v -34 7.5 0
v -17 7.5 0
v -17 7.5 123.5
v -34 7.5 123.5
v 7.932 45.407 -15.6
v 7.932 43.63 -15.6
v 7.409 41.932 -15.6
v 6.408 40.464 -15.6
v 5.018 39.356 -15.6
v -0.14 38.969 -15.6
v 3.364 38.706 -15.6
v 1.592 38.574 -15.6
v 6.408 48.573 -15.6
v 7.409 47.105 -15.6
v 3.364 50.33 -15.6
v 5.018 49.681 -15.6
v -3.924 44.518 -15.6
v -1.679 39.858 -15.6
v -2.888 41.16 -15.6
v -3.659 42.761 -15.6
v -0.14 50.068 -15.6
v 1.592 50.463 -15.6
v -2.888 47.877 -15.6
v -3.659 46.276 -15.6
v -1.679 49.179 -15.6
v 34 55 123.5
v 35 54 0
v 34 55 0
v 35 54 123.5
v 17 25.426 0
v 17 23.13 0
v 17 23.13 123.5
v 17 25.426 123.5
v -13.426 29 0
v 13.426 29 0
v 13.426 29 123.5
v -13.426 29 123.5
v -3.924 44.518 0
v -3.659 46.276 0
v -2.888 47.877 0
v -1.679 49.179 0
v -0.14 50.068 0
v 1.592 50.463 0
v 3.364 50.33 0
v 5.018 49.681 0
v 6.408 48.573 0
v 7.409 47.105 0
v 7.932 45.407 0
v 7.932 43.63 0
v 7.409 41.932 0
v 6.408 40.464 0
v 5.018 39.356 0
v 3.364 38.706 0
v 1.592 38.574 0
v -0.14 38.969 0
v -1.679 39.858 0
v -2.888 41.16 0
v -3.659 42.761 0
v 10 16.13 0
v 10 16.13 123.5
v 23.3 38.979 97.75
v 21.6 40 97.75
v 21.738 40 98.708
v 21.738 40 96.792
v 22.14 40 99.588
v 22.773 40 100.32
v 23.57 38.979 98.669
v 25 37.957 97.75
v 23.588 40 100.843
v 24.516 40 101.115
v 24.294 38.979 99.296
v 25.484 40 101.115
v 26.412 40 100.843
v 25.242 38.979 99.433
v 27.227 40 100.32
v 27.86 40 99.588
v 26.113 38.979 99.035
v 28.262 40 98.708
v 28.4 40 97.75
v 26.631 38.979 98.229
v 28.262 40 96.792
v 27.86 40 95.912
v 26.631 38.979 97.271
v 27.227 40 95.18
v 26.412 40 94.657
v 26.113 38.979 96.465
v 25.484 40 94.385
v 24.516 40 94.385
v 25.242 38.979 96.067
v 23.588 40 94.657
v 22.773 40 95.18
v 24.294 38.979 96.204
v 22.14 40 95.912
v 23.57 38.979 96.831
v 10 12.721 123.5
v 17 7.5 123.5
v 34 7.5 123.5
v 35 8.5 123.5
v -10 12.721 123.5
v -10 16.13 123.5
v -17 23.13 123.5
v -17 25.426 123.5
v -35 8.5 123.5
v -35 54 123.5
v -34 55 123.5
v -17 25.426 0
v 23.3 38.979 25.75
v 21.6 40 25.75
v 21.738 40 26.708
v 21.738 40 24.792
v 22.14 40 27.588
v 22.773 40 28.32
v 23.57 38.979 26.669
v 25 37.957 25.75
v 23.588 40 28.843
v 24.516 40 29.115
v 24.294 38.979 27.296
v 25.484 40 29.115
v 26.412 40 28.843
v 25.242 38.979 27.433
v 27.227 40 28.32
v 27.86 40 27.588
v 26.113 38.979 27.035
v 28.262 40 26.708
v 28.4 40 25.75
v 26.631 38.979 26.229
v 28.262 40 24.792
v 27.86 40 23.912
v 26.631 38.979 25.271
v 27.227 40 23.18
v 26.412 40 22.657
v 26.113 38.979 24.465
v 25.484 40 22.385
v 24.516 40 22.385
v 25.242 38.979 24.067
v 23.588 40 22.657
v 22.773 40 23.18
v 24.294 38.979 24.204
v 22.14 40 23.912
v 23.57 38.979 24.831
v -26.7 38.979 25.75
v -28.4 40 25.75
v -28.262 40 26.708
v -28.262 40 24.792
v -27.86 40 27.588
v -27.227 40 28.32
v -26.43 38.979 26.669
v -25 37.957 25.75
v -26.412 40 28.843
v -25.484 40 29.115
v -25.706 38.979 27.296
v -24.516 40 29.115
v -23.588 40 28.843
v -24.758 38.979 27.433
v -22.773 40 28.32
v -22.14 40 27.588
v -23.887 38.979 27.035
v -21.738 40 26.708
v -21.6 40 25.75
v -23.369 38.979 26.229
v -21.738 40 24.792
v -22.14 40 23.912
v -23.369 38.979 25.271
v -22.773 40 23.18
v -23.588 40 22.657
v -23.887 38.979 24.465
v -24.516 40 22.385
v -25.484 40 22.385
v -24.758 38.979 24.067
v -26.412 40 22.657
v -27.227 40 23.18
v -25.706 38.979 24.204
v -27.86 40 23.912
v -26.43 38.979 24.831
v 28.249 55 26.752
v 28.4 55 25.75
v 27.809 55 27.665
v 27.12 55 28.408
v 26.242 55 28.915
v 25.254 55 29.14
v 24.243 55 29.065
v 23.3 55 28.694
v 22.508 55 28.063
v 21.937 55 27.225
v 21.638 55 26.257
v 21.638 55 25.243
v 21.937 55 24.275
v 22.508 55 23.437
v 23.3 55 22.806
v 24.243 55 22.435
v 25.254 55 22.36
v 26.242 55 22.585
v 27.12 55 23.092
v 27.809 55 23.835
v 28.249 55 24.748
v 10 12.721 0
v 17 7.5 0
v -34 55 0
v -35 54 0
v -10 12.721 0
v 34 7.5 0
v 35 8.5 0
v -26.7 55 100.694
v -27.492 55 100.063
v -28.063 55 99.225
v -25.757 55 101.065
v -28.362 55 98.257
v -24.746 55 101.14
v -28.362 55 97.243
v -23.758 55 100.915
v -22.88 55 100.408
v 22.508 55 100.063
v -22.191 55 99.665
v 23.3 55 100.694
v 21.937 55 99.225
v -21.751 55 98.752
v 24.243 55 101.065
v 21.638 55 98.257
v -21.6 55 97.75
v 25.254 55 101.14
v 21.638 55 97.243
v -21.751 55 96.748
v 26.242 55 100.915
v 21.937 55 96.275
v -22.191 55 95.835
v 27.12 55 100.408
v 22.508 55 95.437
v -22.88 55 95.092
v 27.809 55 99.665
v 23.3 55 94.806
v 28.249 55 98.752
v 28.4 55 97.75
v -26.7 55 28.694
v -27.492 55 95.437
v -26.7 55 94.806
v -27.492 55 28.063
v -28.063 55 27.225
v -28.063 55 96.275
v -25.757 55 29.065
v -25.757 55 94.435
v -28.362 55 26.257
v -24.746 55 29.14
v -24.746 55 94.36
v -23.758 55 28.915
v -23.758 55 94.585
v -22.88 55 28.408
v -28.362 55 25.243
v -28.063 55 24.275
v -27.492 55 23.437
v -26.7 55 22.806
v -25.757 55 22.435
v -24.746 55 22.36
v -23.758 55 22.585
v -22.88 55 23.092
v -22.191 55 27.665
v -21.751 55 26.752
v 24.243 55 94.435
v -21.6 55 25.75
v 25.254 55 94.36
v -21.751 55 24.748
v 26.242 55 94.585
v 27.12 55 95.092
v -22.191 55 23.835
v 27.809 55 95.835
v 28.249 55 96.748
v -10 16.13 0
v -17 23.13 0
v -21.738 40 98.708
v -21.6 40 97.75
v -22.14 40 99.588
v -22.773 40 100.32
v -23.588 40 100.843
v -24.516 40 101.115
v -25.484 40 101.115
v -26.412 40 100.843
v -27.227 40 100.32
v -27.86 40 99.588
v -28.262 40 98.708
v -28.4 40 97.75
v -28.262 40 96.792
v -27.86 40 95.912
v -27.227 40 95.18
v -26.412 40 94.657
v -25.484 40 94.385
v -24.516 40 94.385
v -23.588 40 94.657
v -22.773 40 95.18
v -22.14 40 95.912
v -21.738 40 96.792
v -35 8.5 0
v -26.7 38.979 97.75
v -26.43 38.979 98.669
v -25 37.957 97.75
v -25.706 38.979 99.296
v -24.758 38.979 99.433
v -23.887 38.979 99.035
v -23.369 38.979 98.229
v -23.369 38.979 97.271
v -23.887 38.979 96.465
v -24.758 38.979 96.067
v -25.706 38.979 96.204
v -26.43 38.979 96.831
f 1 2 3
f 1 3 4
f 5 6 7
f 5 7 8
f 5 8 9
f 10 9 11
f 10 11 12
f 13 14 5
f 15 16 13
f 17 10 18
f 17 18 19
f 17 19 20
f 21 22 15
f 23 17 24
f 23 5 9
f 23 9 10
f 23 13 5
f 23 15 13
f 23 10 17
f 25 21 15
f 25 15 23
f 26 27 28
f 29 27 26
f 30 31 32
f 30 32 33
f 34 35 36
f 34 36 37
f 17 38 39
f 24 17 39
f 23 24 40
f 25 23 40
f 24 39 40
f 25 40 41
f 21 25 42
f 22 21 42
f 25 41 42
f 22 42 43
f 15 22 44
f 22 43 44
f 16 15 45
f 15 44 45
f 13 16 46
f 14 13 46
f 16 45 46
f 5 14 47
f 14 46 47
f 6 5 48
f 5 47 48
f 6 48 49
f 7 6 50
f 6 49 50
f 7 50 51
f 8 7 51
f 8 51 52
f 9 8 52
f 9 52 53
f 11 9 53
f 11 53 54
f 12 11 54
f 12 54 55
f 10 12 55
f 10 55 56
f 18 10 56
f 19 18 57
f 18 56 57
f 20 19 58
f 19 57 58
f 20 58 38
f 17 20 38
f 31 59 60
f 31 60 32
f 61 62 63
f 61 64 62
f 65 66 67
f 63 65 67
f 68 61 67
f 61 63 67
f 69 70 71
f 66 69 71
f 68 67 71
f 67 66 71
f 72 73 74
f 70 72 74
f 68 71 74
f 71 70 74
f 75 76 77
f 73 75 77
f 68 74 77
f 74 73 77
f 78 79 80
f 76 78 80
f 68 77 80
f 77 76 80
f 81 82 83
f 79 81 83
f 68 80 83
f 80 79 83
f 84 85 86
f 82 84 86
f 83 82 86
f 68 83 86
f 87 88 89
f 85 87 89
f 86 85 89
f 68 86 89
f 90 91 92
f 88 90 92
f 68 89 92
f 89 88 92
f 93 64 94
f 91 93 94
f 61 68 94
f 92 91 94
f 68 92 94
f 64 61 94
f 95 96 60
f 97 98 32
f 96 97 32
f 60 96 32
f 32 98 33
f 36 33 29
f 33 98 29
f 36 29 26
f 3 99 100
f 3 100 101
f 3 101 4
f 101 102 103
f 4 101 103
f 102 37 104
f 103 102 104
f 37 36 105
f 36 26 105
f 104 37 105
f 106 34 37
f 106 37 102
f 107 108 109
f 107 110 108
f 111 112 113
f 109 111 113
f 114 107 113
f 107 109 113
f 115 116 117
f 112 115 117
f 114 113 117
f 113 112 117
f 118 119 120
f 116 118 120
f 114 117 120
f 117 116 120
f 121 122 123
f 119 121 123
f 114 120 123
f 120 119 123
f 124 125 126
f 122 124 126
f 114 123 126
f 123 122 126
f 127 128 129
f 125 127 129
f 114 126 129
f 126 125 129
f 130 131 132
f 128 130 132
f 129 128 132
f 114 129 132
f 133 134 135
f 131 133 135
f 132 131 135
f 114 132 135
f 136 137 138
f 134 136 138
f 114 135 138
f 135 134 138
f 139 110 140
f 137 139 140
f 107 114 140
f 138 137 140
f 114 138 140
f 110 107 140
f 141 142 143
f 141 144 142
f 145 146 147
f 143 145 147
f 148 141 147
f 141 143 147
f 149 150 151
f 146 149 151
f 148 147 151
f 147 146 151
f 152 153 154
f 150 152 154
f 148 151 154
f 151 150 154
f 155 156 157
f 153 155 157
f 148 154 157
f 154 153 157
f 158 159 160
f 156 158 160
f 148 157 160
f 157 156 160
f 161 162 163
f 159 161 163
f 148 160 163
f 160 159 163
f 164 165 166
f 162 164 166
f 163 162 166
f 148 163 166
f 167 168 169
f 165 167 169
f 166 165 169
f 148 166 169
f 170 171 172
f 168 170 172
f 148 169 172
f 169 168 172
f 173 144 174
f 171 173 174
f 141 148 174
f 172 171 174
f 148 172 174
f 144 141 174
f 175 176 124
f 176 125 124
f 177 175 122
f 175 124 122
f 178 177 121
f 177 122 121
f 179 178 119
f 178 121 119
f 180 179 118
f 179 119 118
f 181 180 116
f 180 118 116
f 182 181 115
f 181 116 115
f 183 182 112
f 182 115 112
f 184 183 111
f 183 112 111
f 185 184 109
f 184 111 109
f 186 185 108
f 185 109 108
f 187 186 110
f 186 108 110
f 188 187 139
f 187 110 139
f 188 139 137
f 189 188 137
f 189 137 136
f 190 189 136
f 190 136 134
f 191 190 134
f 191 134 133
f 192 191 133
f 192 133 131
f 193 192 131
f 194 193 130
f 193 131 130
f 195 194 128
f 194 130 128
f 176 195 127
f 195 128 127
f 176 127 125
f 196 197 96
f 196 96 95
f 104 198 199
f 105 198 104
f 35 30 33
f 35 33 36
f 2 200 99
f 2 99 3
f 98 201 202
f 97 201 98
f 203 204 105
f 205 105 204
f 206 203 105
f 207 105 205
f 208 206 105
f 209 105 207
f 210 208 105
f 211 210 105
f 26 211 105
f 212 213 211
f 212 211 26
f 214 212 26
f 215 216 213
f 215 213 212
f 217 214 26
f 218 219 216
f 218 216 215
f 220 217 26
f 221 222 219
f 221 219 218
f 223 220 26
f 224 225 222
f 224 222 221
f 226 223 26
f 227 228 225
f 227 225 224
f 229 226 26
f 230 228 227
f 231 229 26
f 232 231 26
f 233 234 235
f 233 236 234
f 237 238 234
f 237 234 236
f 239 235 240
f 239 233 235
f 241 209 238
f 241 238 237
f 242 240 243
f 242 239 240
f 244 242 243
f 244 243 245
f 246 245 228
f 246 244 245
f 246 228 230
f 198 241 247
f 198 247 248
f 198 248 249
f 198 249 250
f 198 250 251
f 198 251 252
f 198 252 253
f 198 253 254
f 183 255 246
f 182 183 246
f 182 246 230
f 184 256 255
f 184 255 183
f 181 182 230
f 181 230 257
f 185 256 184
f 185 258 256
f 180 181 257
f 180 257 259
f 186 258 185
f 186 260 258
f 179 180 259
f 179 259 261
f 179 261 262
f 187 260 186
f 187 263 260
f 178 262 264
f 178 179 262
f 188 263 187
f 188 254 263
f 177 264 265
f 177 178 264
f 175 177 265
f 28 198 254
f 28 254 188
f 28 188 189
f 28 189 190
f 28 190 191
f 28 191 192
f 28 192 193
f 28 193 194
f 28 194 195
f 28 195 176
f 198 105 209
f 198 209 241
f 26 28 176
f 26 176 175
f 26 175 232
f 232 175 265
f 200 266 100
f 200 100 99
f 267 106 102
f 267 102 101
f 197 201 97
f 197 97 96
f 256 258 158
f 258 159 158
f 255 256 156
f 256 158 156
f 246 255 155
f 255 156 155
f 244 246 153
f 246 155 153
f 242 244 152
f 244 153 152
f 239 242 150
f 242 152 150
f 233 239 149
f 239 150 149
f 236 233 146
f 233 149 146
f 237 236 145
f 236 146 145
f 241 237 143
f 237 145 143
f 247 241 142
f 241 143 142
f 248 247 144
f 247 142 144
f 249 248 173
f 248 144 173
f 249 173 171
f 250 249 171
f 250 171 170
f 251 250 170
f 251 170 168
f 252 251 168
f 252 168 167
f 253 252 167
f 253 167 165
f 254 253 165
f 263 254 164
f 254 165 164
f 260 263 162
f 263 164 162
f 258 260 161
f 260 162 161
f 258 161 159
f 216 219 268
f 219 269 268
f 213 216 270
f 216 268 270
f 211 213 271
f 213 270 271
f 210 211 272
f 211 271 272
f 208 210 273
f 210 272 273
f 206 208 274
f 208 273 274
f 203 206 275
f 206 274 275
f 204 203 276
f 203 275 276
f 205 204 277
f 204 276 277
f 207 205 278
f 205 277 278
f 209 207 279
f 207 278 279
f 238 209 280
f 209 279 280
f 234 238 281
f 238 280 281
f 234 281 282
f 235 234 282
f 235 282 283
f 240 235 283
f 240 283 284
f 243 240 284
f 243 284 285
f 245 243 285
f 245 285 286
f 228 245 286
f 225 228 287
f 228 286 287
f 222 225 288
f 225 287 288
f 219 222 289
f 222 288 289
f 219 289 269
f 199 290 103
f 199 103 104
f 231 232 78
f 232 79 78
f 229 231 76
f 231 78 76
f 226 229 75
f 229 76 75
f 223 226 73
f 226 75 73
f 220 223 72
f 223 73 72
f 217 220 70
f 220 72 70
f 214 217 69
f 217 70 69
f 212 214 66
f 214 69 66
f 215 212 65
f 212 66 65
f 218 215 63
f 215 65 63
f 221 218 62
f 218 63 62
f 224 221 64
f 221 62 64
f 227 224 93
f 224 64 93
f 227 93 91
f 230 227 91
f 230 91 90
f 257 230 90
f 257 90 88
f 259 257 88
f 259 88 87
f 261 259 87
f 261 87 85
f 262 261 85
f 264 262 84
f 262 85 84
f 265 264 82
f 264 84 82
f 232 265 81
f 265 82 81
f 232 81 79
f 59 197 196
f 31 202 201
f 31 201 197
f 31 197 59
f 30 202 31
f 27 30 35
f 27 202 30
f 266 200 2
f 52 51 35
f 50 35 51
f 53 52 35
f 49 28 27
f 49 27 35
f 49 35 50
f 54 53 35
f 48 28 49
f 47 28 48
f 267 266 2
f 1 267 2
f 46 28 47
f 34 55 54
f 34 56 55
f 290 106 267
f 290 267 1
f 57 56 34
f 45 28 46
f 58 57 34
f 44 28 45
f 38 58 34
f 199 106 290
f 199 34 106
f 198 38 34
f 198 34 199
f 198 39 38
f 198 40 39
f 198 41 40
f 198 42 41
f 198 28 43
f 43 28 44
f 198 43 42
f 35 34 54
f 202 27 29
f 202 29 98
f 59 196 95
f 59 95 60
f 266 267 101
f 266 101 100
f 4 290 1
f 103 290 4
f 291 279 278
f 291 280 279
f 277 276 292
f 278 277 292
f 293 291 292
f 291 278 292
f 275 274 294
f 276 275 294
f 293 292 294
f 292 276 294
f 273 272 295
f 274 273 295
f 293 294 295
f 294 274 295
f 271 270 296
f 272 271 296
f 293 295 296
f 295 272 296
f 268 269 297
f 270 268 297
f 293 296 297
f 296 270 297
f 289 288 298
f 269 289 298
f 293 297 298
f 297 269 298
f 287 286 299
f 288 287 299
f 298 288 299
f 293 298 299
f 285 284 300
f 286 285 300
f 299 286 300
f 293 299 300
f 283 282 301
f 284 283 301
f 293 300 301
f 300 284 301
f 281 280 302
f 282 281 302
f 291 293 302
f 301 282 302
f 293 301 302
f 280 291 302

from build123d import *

# Parameters (mm, degrees)
EXTRUDE_1_DEPTH        = 123.5
CHAMFER_1_SIZE         = 1
HOLE_WIZARD_M8_1_D     = 6.8
HOLE_WIZARD_M8_1_DEPTH = 15
HOLE_WIZARD_M8_1_TIP   = 2.042926105
SKETCH_5_R             = 5.961453201
EXTRUDE_2_DEPTH        = 15.6


with BuildPart() as part:
    # 草圖2 → 伸長1 (new body)
    with BuildSketch(Plane.XY):
        Polygon((-17, 7.5), (-35, 7.5), (-35, 55), (35, 55), (35, 7.5), (17, 7.5), (10, 12.721375014), (10, 16.129907798), (17, 23.129907798), (17, 25.4259063), (13.4259063, 29), (-13.4259063, 29), (-17, 25.4259063), (-17, 23.129907798), (-10, 16.129907798), (-10, 12.721375014), align=None)
    extrude(amount=EXTRUDE_1_DEPTH)

    # 導角1
    chamfer_1_edges = [part.edges().sort_by_distance(p)[0] for p in [
        (-35, 7.5, 61.75),
        (-35, 55, 61.75),
        (35, 55, 61.75),
        (35, 7.5, 61.75),
    ]]
    chamfer(chamfer_1_edges, length=CHAMFER_1_SIZE)

    # M8 螺紋孔1
    with Locations(Plane(origin=(0, 55, 0), x_dir=(-1, 0, 0), z_dir=(0, 1, 0))):
        with Locations((25, 97.75), (25, 25.75), (-25, 25.75), (-25, 97.75)):
            Hole(HOLE_WIZARD_M8_1_D / 2, depth=HOLE_WIZARD_M8_1_DEPTH)
            with Locations((0, 0, -(HOLE_WIZARD_M8_1_DEPTH + HOLE_WIZARD_M8_1_TIP / 2))):  # 118° drill point
                Cone(0, HOLE_WIZARD_M8_1_D / 2, HOLE_WIZARD_M8_1_TIP, mode=Mode.SUBTRACT)

    # 草圖5 → 伸長2 (add)
    with BuildSketch(Plane(origin=(0, 0, 0), x_dir=(-1, 0, 0), z_dir=(0, 0, -1))):
        with Locations((-2.037583141, 44.518465944)):
            Circle(SKETCH_5_R)
    extrude(amount=EXTRUDE_2_DEPTH)


solid = part.part
